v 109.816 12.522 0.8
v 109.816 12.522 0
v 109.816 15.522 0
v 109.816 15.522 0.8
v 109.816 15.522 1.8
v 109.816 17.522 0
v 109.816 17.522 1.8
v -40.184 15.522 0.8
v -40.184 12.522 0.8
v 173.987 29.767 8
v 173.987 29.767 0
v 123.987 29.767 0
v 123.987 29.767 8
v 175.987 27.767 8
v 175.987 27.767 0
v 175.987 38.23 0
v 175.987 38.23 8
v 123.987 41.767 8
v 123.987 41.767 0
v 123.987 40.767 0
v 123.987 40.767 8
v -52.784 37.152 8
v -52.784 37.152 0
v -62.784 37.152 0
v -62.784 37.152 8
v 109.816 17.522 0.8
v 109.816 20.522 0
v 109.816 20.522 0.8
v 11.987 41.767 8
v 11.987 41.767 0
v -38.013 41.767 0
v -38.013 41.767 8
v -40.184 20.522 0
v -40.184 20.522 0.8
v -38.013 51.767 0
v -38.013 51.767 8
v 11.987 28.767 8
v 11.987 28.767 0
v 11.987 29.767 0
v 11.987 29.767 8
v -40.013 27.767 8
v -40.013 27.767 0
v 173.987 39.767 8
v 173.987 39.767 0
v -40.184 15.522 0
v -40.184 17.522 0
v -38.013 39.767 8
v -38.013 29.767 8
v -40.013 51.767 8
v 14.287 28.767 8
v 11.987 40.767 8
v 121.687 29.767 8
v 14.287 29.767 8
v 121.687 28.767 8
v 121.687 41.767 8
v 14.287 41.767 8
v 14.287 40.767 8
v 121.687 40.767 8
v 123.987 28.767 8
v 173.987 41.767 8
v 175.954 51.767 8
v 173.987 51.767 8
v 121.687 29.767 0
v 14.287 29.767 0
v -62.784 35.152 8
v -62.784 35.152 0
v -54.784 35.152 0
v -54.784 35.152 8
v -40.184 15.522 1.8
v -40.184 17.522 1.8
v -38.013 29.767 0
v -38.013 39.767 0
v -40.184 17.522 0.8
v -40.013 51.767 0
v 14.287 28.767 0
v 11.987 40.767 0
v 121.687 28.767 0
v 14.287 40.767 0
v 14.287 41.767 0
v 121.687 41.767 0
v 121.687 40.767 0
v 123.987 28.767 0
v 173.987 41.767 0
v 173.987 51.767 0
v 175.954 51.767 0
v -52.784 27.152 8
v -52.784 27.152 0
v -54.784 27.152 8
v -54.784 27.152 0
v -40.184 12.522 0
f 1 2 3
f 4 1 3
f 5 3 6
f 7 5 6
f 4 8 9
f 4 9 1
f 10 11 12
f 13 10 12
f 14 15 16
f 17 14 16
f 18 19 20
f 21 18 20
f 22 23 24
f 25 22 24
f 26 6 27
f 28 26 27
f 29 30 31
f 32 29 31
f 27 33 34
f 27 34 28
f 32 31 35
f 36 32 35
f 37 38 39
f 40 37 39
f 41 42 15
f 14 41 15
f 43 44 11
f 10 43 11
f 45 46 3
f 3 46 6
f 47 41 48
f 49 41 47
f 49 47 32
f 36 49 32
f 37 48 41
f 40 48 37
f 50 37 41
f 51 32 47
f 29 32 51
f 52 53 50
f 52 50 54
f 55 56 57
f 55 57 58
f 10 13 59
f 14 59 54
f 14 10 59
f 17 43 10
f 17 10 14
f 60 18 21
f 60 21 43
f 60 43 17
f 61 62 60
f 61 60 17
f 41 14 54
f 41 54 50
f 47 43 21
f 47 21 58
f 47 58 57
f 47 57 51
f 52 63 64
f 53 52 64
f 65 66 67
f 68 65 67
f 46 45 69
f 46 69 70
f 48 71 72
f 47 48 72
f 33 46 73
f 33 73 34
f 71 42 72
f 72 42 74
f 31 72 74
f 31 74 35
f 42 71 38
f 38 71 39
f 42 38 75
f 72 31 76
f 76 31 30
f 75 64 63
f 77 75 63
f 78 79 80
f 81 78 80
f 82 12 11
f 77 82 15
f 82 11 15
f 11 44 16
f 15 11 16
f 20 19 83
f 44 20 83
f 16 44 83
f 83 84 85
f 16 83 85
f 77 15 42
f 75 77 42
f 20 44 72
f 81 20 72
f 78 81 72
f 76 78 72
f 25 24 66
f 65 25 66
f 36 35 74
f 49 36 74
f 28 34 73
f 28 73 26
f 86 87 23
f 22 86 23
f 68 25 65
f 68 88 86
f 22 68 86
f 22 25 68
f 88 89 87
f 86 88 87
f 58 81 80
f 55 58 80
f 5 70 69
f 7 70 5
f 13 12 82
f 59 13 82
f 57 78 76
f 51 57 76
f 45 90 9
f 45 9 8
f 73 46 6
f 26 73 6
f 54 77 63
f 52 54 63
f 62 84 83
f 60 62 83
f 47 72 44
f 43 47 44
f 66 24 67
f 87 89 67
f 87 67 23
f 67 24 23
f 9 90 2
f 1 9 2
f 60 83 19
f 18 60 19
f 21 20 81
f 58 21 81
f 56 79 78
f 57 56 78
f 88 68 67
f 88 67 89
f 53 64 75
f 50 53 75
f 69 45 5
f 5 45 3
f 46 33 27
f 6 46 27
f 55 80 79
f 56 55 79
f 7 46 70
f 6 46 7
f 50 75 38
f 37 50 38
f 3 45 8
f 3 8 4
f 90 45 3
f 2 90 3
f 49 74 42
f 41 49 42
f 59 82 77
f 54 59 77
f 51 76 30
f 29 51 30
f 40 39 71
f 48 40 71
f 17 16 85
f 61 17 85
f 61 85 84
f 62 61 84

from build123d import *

# Parameters (mm, degrees)
F1_DEPTH = 8
F0_W     = 150
F0_H     = 3
F2_DEPTH = 0.8
F0_H_2   = 2
F3_DEPTH = 1.8


with BuildPart() as f1:
    # F0 (on Top) → F1 (new body)
    with BuildSketch(Plane.XY):
        Polygon((-52.784398, 37.152224), (-62.784398, 37.152224), (-62.784398, 35.152224), (-54.784398, 35.152224), (-54.784398, 27.152224), (-52.784398, 27.152224), align=None)
        Polygon((173.986718, 51.766858), (173.986718, 41.766858), (123.986718, 41.766858), (123.986718, 40.766858), (121.686718, 40.766858), (121.686718, 41.766858), (14.286718, 41.766858), (14.286718, 40.766858), (11.986718, 40.766858), (11.986718, 41.766858), (-38.013282, 41.766858), (-38.013282, 51.766858), (-40.013282, 51.766858), (-40.013282, 27.766858), (175.986718, 27.766858), (175.986718, 38.23043), (175.954312, 51.766858), align=None)
        Polygon((11.986718, 29.766858), (-38.013282, 29.766858), (-38.013282, 39.766858), (173.986718, 39.766858), (173.986718, 38.23043), (173.986718, 29.766858), (123.986718, 29.766858), (123.986718, 28.766858), (121.686718, 28.766858), (121.686718, 29.766858), (14.286718, 29.766858), (14.286718, 28.766858), (11.986718, 28.766858), align=None, mode=Mode.SUBTRACT)
    extrude(amount=F1_DEPTH)


with BuildPart() as f2:
    # F0 (on Top) → F2 (new body)
    with BuildSketch(Plane.XY):
        with Locations((34.815613, 14.022086)):
            Rectangle(F0_W, F0_H)
        with Locations((34.815613, 19.022086)):
            Rectangle(F0_W, F0_H)
    extrude(amount=F2_DEPTH)


with BuildPart() as f3:
    # F0 (on Top) → F3 (new body)
    with BuildSketch(Plane.XY):
        with Locations((34.815613, 16.522086)):
            Rectangle(F0_W, F0_H_2)
    extrude(amount=F3_DEPTH)


solid = Compound([f1.part, f2.part, f3.part])
